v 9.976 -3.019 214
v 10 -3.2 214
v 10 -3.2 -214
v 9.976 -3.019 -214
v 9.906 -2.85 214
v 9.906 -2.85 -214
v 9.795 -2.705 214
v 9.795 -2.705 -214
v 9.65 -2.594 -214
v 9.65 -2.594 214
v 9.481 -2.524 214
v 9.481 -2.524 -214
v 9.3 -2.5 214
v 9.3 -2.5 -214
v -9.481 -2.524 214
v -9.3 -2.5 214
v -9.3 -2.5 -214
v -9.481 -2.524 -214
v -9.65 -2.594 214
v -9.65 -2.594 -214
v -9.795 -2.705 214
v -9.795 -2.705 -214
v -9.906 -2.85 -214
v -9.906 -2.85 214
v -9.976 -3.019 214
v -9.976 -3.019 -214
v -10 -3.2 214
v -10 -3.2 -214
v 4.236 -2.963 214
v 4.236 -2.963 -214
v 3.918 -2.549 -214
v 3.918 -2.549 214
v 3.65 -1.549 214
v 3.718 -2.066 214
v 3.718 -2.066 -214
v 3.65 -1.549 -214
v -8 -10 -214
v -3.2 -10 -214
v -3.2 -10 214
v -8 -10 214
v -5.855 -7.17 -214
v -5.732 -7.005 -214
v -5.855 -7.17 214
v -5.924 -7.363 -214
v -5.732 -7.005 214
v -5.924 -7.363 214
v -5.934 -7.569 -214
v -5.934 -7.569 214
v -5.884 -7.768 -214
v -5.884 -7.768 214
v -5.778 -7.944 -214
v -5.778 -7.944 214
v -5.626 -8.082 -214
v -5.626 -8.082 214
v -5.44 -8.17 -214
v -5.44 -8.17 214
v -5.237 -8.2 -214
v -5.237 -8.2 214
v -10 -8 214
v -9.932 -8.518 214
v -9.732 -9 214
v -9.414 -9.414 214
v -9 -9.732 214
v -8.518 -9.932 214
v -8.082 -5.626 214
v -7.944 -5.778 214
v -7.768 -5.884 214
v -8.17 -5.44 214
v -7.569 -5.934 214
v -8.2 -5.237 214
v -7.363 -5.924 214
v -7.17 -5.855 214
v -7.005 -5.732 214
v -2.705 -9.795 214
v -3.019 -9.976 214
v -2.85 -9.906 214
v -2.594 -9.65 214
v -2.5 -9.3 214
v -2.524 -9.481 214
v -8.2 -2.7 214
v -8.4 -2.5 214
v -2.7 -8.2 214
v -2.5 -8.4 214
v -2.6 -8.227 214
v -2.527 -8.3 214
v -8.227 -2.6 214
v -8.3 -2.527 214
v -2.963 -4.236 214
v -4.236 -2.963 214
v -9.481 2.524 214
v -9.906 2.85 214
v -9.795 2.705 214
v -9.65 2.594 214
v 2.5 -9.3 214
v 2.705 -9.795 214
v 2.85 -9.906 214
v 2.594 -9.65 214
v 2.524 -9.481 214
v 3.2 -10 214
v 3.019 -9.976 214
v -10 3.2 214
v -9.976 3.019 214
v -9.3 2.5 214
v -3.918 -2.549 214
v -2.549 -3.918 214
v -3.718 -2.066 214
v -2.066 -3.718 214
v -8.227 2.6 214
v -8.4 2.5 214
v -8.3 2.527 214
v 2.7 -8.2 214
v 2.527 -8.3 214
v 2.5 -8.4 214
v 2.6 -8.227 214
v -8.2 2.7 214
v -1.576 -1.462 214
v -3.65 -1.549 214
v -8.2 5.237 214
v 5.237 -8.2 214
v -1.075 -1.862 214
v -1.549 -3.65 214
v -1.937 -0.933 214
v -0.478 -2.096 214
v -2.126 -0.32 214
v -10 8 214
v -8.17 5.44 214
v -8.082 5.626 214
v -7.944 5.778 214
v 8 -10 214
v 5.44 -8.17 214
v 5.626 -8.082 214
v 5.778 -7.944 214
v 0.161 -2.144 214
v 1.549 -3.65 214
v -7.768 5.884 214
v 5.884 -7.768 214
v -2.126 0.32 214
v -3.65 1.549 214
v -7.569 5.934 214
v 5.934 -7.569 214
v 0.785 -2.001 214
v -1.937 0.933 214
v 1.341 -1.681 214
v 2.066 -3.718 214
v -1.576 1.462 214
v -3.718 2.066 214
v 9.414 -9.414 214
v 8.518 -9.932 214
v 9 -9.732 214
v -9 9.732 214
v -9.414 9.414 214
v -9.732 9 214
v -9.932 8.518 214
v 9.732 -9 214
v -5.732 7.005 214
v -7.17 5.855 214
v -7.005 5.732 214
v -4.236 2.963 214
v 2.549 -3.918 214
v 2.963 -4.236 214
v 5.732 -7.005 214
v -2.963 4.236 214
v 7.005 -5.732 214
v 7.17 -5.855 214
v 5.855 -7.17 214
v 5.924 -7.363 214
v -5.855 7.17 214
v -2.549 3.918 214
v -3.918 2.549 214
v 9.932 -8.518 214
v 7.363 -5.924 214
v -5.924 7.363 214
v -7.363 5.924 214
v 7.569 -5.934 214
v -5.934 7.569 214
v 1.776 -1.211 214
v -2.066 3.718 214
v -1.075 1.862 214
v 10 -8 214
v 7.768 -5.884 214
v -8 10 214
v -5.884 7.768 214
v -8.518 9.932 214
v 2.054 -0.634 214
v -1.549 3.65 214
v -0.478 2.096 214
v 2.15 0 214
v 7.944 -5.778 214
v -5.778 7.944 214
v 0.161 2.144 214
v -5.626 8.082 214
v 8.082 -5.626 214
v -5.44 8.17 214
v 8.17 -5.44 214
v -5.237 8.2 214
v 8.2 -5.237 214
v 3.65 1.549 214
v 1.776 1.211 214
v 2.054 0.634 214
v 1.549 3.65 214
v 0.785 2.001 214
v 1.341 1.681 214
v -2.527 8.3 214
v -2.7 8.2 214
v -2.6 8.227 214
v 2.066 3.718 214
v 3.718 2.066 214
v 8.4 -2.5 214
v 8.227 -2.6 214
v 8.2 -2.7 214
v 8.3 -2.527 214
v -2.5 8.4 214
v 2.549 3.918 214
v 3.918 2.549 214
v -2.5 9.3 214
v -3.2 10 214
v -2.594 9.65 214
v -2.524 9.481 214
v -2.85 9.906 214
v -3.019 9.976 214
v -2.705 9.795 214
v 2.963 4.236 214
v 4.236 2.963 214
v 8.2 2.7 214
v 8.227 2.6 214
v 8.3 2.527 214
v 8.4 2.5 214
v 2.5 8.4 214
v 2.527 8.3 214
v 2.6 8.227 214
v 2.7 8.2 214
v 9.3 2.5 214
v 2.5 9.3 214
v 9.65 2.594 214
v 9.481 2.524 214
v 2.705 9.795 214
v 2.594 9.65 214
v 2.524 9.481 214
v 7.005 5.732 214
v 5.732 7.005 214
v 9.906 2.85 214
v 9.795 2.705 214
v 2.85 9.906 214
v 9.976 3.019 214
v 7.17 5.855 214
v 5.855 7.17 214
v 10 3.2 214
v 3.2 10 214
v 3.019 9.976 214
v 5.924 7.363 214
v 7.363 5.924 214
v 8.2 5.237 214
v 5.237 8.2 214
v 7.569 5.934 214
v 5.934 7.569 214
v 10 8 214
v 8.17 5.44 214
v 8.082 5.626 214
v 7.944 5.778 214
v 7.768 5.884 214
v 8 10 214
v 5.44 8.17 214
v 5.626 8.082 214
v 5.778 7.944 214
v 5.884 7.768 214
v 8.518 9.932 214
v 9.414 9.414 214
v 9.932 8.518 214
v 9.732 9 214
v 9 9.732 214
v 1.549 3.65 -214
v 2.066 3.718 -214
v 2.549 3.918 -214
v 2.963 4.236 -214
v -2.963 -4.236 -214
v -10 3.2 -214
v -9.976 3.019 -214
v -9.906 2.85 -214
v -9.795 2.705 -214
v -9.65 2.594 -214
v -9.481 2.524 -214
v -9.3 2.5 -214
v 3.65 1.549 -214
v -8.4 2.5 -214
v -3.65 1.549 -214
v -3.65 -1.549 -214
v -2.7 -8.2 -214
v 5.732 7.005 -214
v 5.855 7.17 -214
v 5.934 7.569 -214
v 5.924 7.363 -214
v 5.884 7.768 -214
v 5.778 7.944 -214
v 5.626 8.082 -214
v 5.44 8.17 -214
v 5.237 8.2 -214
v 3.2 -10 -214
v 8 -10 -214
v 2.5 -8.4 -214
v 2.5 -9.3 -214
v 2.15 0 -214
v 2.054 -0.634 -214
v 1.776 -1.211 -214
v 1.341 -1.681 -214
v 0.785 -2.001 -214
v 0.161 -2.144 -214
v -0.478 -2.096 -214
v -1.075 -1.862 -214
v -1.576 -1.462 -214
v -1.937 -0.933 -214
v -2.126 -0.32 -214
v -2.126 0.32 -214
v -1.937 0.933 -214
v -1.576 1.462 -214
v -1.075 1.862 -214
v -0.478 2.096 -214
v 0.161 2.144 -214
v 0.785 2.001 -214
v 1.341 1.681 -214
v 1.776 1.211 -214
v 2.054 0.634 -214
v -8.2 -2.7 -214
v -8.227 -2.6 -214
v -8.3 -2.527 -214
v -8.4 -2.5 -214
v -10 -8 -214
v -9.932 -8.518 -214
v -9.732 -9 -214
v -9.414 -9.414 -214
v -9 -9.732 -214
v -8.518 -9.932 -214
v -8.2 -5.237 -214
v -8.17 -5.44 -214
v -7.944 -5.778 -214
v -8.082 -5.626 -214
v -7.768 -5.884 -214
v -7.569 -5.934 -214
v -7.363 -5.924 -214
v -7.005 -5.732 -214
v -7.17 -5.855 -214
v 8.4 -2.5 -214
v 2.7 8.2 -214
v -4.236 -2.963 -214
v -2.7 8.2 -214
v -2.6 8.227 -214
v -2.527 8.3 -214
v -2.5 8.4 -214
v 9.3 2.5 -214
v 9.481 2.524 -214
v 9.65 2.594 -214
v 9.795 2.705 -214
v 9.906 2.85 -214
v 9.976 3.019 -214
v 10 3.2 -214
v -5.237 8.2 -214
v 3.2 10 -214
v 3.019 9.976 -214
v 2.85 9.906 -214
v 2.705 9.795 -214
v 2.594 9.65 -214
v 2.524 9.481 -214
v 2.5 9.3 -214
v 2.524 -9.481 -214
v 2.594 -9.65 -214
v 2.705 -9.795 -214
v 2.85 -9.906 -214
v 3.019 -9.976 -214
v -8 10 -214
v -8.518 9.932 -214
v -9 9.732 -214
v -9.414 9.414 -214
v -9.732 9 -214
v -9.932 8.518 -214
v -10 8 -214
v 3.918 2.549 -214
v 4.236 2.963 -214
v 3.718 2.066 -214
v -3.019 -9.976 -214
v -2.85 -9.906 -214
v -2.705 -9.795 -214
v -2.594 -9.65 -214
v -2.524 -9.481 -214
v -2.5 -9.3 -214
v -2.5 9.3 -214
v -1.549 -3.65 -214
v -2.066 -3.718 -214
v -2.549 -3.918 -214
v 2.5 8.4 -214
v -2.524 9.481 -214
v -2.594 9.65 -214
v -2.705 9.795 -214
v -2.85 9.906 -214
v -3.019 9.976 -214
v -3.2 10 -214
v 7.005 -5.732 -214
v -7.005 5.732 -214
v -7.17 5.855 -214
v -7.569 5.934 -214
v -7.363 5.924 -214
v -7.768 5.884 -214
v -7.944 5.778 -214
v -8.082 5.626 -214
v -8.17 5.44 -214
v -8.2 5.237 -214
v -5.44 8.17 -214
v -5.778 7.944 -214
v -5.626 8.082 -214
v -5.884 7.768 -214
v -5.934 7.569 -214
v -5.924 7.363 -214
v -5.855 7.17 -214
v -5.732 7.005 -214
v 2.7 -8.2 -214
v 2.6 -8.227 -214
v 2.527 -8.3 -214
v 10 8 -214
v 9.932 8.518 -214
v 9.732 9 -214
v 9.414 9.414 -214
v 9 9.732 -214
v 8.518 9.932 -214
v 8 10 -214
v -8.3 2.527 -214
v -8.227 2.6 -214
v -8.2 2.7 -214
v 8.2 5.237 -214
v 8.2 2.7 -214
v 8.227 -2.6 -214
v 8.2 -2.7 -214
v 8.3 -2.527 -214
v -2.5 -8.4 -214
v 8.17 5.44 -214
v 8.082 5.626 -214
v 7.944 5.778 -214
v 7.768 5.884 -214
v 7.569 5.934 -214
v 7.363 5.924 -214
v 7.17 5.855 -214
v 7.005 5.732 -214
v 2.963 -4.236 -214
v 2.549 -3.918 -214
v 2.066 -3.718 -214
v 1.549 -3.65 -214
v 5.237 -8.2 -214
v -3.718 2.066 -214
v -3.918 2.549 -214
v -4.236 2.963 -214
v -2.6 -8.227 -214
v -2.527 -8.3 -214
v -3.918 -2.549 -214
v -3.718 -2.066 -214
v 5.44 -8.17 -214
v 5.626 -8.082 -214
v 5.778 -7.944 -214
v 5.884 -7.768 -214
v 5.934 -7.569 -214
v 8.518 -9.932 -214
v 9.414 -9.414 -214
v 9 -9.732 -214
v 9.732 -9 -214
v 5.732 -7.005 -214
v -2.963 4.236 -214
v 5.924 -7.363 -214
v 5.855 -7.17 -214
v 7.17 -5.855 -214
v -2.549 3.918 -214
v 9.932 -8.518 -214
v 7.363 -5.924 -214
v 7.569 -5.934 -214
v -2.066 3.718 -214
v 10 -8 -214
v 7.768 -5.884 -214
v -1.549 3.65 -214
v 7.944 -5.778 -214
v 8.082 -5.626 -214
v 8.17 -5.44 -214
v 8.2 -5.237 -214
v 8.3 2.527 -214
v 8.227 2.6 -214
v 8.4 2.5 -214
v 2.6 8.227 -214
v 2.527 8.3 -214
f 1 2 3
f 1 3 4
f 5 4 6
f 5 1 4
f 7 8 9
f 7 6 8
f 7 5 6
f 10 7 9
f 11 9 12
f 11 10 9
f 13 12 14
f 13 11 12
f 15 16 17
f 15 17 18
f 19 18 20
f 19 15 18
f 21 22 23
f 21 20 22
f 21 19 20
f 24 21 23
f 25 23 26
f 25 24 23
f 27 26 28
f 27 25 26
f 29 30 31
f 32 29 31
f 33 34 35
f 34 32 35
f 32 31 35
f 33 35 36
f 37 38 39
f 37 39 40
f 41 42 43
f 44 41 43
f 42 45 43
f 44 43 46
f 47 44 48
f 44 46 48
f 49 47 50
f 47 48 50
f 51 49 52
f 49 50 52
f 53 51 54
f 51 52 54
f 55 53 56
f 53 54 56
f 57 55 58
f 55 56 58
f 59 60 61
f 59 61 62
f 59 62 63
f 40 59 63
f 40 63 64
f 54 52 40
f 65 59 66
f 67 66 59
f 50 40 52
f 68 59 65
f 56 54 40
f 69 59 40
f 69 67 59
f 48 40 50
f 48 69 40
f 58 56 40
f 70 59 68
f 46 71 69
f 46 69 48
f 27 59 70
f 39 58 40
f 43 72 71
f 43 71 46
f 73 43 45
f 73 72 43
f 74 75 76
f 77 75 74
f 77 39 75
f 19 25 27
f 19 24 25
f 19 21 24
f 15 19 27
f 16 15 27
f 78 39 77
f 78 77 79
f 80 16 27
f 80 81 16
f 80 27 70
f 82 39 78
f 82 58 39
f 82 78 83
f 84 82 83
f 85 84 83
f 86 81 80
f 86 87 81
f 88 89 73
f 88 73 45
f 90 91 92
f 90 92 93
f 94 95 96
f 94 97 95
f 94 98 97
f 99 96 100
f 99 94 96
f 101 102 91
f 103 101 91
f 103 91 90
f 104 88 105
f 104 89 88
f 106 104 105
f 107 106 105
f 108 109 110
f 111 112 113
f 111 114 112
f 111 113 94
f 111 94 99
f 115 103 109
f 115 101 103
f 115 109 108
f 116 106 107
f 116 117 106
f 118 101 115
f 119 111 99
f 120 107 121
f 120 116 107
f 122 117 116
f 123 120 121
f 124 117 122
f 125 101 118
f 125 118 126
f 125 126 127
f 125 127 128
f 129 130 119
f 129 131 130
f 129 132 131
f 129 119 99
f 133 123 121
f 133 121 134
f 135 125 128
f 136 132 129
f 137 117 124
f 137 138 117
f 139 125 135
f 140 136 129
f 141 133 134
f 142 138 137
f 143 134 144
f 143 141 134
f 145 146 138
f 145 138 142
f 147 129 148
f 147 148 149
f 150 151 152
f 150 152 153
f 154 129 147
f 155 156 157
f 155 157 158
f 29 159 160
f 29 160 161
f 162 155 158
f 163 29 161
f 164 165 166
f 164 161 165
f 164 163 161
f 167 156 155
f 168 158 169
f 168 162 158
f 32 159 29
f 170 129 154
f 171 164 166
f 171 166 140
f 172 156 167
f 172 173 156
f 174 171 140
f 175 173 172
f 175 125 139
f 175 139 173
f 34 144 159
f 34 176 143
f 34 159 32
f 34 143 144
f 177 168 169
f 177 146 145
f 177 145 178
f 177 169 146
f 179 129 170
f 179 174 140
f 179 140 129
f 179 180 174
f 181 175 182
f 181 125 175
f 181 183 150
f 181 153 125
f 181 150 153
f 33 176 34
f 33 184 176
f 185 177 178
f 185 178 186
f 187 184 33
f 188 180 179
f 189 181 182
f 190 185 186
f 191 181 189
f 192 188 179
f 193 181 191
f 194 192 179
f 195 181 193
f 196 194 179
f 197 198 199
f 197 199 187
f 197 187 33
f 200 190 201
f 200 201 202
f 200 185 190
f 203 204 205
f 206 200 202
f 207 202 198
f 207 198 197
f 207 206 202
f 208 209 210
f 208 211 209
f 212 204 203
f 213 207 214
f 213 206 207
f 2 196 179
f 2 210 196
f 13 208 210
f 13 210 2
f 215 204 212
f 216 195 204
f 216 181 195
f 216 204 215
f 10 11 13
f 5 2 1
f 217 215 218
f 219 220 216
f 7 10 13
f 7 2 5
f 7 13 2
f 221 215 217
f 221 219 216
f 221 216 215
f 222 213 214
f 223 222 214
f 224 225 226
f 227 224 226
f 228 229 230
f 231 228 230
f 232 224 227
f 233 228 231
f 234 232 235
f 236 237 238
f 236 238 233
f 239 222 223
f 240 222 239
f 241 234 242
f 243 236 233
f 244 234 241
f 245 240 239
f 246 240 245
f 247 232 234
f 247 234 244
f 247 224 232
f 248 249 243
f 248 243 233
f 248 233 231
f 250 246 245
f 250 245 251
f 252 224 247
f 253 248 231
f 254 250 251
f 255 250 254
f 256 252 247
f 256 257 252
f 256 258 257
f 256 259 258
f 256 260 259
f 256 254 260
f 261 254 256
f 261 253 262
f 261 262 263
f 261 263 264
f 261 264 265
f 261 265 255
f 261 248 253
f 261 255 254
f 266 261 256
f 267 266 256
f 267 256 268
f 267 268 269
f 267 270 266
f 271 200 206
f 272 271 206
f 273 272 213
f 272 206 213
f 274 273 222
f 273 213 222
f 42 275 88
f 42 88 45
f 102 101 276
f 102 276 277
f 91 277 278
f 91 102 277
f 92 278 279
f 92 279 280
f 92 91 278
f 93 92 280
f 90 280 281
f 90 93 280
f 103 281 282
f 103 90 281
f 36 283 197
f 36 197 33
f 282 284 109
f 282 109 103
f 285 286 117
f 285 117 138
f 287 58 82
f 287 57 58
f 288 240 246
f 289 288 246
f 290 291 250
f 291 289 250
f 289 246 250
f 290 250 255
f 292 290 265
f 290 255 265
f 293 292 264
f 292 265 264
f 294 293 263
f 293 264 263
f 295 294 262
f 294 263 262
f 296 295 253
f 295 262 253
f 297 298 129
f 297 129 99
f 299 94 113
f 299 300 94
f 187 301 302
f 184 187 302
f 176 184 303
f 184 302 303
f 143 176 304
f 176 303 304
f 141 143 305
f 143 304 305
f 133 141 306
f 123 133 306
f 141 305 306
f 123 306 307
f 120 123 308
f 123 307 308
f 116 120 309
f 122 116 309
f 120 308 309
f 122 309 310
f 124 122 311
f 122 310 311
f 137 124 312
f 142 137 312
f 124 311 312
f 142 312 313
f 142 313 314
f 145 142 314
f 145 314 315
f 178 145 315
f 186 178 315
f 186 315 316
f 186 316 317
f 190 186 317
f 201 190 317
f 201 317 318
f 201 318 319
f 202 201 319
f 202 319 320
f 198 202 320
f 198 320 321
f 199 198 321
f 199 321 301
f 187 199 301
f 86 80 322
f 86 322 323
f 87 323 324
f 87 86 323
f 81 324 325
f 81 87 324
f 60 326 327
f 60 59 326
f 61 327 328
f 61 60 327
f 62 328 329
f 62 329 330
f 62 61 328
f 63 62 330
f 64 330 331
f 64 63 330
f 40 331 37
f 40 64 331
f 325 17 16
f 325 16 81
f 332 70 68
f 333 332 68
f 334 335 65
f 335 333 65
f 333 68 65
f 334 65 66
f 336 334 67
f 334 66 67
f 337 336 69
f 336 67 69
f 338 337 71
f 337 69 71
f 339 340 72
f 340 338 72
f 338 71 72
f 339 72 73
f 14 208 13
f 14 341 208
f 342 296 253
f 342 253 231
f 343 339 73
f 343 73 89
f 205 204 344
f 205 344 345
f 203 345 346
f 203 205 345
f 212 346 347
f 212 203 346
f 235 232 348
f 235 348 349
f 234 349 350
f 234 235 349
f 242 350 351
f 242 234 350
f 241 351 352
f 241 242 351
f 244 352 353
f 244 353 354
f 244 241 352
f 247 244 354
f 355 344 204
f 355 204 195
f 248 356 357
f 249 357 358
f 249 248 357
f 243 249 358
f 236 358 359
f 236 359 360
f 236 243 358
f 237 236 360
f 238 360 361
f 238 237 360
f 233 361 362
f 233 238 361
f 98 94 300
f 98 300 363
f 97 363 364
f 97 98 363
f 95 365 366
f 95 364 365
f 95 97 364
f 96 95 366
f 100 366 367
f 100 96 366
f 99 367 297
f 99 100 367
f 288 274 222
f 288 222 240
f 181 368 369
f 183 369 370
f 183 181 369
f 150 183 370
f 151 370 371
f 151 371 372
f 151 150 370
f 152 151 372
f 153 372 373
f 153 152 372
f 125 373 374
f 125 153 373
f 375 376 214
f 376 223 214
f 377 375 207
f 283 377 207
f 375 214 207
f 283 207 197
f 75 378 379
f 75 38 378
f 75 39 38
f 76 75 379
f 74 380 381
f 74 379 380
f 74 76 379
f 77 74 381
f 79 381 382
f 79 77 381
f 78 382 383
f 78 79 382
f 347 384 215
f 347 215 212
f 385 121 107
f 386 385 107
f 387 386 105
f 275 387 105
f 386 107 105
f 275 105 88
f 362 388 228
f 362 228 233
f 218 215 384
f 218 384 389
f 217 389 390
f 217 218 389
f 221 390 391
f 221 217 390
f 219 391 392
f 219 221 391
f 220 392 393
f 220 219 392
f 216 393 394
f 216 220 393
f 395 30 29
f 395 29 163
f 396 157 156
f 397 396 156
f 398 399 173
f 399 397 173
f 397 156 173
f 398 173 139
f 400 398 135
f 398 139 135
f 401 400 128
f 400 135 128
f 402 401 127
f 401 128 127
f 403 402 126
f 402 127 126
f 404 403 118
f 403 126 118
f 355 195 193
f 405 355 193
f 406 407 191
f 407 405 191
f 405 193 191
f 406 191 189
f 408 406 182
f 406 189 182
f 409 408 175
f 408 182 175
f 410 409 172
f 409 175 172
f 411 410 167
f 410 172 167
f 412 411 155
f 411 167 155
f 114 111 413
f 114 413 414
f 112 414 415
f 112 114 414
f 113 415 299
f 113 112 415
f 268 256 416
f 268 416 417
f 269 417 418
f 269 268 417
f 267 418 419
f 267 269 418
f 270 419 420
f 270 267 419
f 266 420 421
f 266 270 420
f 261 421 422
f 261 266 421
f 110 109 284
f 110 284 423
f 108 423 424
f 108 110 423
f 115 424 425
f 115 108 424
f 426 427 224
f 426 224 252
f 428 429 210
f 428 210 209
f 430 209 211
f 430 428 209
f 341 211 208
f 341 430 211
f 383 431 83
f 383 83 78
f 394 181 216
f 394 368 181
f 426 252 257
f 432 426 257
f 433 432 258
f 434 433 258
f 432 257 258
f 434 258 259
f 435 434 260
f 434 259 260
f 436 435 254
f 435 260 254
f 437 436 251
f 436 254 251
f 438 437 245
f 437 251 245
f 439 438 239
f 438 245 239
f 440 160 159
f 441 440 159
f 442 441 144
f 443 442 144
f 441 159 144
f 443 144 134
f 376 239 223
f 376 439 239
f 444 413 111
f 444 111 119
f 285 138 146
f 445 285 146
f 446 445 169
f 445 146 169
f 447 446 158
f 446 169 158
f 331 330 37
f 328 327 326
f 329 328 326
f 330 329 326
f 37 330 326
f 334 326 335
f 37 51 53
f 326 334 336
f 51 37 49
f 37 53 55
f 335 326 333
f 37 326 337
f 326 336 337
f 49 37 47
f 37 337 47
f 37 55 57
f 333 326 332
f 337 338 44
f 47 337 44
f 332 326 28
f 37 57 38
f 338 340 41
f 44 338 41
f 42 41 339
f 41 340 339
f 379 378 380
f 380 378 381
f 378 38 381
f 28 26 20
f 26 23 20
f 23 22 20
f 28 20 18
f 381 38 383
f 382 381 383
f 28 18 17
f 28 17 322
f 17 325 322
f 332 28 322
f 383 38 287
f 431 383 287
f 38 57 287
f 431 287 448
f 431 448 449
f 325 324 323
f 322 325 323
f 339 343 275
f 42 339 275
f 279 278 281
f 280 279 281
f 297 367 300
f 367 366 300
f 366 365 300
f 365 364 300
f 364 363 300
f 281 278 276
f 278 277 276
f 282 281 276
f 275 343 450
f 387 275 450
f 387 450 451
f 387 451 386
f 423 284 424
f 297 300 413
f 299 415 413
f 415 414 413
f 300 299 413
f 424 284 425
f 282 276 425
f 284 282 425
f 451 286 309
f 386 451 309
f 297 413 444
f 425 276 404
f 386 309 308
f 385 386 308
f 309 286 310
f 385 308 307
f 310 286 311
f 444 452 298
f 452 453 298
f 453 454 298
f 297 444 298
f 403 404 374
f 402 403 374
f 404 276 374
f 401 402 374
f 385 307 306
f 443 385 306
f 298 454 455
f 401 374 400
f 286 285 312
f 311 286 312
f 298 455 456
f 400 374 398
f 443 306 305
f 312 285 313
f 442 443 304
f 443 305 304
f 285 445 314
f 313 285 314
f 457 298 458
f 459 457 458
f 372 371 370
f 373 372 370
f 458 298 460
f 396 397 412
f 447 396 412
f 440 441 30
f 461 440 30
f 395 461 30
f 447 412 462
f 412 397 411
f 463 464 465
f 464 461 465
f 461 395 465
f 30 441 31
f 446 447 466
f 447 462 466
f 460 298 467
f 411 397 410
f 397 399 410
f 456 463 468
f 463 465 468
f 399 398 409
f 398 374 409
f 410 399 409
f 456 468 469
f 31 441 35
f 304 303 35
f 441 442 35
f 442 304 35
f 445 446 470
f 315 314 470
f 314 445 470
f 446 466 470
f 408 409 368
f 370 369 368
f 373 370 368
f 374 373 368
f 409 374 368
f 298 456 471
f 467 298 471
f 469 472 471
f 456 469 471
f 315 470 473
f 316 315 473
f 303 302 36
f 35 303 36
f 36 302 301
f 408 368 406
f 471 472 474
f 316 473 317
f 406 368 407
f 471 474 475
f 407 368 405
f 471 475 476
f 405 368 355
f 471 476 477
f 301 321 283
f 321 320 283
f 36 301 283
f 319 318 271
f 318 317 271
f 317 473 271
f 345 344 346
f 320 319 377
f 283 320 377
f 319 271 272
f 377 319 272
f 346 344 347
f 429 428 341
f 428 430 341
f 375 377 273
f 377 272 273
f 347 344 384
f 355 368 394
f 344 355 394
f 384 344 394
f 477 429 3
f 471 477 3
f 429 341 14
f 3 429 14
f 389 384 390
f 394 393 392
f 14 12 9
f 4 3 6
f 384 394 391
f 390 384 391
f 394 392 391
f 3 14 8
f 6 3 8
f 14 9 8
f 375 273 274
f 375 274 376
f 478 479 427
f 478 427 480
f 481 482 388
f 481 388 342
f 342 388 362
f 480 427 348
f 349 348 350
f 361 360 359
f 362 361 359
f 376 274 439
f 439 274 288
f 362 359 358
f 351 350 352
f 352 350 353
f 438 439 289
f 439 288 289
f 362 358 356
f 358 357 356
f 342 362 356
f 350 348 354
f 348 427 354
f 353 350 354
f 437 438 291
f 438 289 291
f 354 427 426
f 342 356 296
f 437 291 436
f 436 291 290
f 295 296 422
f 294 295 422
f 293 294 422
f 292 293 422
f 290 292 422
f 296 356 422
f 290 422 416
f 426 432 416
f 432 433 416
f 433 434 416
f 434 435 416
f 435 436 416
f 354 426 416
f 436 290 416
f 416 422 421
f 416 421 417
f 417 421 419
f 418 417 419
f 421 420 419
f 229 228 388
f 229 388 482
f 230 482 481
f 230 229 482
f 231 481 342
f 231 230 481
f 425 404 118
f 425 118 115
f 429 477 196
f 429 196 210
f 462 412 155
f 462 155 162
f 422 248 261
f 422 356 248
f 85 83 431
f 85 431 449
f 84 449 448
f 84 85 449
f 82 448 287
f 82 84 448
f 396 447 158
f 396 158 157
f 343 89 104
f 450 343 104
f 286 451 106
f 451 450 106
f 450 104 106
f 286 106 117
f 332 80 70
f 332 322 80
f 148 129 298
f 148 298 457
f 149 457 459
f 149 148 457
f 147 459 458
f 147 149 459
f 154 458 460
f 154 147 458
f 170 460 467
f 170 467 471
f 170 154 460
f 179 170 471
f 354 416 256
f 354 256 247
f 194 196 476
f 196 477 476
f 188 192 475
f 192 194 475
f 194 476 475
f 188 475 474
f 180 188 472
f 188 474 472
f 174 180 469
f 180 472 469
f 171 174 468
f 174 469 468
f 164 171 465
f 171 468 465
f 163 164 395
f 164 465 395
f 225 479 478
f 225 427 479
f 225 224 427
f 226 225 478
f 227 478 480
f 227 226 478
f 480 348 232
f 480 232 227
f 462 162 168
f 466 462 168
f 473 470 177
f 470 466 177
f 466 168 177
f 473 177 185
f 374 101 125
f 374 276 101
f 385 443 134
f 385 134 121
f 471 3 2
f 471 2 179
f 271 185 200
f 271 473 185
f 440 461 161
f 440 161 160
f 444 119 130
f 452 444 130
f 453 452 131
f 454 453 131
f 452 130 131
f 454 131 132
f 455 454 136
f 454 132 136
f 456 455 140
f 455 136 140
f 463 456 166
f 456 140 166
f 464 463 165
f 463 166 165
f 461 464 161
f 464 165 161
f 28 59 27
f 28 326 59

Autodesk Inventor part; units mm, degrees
ref_plane "YZ Plane" through (0, 0, 0) normal (1, 0, 0) x (0, 1, 0)
ref_plane "XZ Plane" through (0, 0, 0) normal (0, 1, 0) x (-1, 0, 0)
ref_plane "XY Plane" through (0, 0, 0) normal (0, 0, 1) x (1, 0, 0)
sketch "Sketch1" plane through (0, 0, 0) normal (0, 0, 1) x (1, 0, 0)
  circle A0 centre (0, 0) radius 2.15
  line L0 (-10, 10) -> (-2.5, 10)
  line L1 (-2.5, 10) -> (-2.5, 8.2)
  line L2 (-2.5, 8.2) -> (-6.9272, 8.2)
  line L3 (-6.9272, 8.2) -> (-2.3772, 3.65)
  line L4 (-2.3772, 3.65) -> (2.3772, 3.65)
  line L5 (2.3772, 3.65) -> (6.9272, 8.2)
  line L6 (6.9272, 8.2) -> (2.5, 8.2)
  line L7 (2.5, 8.2) -> (2.5, 10)
  line L8 (2.5, 10) -> (10, 10)
  line L9 (10, 10) -> (10, 2.5)
  line L10 (10, 2.5) -> (8.2, 2.5)
  line L11 (8.2, 2.5) -> (8.2, 6.9272)
  line L12 (8.2, 6.9272) -> (3.65, 2.3772)
  line L13 (3.65, 2.3772) -> (3.65, -2.3772)
  line L14 (3.65, -2.3772) -> (8.2, -6.9272)
  line L15 (8.2, -6.9272) -> (8.2, -2.5)
  line L16 (8.2, -2.5) -> (10, -2.5)
  line L17 (10, -2.5) -> (10, -10)
  line L18 (10, -10) -> (2.5, -10)
  line L19 (2.5, -10) -> (2.5, -8.2)
  line L20 (2.5, -8.2) -> (6.9272, -8.2)
  line L21 (6.9272, -8.2) -> (2.3772, -3.65)
  line L22 (2.3772, -3.65) -> (-2.3772, -3.65)
  line L23 (-2.3772, -3.65) -> (-6.9272, -8.2)
  line L24 (-6.9272, -8.2) -> (-2.5, -8.2)
  line L25 (-2.5, -8.2) -> (-2.5, -10)
  line L26 (-2.5, -10) -> (-10, -10)
  line L27 (-10, -10) -> (-10, -2.5)
  line L28 (-10, -2.5) -> (-8.2, -2.5)
  line L29 (-8.2, -2.5) -> (-8.2, -6.9272)
  line L30 (-8.2, -6.9272) -> (-3.65, -2.3772)
  line L31 (-3.65, -2.3772) -> (-3.65, 2.3772)
  line L32 (-3.65, 2.3772) -> (-8.2, 6.9272)
  line L33 (-8.2, 6.9272) -> (-8.2, 2.5)
  line L34 (-8.2, 2.5) -> (-10, 2.5)
  line L35 (-10, 2.5) -> (-10, 10)
  line L36 (0, 0) -> (-30.8654, 30.8654)
  line L37 (0, 0) -> (30.8654, 30.8654)
  line L38 (0, 0) -> (42.5392, 0)
  line L39 (0, 0) -> (0, 44.3419)
  dimension "d0" = 45
  dimension "d1" = 90
  dimension "Breite" = 20
  dimension "Tiefe_Schiene" = 6.35
  dimension "d2" = 1.8
  dimension "Durchmesser_Loch" = 4.3
  dimension "Wandstaerke" = 1.8
  dimension "d3" = 1.8
  dimension "Breite_Schiene" = 5
  dimension "d4" = 5
extrude "Extrusion1" add sketch "Sketch1" along normal mid plane 428 contours L38 L13 L14 L15 L16 L17 L18 L19 L20 L21 L22 L23 L24 L25 L26 L27 L28 L29 L30 L31 L32 L33 L34 L35 L36 A0 | A0 L37 L9 L10 L11 L12 L13 L38 | A0 L39 L4 L5 L6 L7 L8 L37 | L36 L0 L1 L2 L3 L4 L39 A0
fillet "Fillet1" radius 2 4 edges at (10, 10, 0) (-10, 10, 0) (10, -10, 0) (-10, -10, 0)
fillet "Fillet2" radius 0.2 8 edges at (-2.5, 8.2, 0) (2.5, 8.2, 0) (8.2, 2.5, 0) (8.2, -2.5, 0) (-2.5, -8.2, 0) (-8.2, -2.5, 0) (-8.2, 2.5, 0) (2.5, -8.2, 0)
fillet "Fillet3" radius 0.7 16 edges at (-2.5, 10, 0) (2.5, 10, 0) (10, 2.5, 0) (10, -2.5, 0) (2.5, -10, 0) (-2.5, -10, 0) (-10, -2.5, 0) (-10, 2.5, 0) (-6.9272, -8.2, 0) (-8.2, -6.9272, 0) (6.9272, -8.2, 0) (8.2, -6.9272, 0) (8.2, 6.9272, 0) (6.9272, 8.2, 0) (-6.9272, 8.2, 0) (-8.2, 6.9272, 0)
fillet "Fillet4" radius 2 8 edges at (-3.65, 2.3772, 0) (-2.3772, 3.65, 0) (2.3772, 3.65, 0) (3.65, 2.3772, 0) (3.65, -2.3772, 0) (2.3772, -3.65, 0) (-2.3772, -3.65, 0) (-3.65, -2.3772, 0)
equation "\"d2\" = Wandstaerke"
equation "\"d3\" = Wandstaerke"
equation "\"d4\" = Breite_Schiene"
properties part number "ITEM_20x20_428mm"
